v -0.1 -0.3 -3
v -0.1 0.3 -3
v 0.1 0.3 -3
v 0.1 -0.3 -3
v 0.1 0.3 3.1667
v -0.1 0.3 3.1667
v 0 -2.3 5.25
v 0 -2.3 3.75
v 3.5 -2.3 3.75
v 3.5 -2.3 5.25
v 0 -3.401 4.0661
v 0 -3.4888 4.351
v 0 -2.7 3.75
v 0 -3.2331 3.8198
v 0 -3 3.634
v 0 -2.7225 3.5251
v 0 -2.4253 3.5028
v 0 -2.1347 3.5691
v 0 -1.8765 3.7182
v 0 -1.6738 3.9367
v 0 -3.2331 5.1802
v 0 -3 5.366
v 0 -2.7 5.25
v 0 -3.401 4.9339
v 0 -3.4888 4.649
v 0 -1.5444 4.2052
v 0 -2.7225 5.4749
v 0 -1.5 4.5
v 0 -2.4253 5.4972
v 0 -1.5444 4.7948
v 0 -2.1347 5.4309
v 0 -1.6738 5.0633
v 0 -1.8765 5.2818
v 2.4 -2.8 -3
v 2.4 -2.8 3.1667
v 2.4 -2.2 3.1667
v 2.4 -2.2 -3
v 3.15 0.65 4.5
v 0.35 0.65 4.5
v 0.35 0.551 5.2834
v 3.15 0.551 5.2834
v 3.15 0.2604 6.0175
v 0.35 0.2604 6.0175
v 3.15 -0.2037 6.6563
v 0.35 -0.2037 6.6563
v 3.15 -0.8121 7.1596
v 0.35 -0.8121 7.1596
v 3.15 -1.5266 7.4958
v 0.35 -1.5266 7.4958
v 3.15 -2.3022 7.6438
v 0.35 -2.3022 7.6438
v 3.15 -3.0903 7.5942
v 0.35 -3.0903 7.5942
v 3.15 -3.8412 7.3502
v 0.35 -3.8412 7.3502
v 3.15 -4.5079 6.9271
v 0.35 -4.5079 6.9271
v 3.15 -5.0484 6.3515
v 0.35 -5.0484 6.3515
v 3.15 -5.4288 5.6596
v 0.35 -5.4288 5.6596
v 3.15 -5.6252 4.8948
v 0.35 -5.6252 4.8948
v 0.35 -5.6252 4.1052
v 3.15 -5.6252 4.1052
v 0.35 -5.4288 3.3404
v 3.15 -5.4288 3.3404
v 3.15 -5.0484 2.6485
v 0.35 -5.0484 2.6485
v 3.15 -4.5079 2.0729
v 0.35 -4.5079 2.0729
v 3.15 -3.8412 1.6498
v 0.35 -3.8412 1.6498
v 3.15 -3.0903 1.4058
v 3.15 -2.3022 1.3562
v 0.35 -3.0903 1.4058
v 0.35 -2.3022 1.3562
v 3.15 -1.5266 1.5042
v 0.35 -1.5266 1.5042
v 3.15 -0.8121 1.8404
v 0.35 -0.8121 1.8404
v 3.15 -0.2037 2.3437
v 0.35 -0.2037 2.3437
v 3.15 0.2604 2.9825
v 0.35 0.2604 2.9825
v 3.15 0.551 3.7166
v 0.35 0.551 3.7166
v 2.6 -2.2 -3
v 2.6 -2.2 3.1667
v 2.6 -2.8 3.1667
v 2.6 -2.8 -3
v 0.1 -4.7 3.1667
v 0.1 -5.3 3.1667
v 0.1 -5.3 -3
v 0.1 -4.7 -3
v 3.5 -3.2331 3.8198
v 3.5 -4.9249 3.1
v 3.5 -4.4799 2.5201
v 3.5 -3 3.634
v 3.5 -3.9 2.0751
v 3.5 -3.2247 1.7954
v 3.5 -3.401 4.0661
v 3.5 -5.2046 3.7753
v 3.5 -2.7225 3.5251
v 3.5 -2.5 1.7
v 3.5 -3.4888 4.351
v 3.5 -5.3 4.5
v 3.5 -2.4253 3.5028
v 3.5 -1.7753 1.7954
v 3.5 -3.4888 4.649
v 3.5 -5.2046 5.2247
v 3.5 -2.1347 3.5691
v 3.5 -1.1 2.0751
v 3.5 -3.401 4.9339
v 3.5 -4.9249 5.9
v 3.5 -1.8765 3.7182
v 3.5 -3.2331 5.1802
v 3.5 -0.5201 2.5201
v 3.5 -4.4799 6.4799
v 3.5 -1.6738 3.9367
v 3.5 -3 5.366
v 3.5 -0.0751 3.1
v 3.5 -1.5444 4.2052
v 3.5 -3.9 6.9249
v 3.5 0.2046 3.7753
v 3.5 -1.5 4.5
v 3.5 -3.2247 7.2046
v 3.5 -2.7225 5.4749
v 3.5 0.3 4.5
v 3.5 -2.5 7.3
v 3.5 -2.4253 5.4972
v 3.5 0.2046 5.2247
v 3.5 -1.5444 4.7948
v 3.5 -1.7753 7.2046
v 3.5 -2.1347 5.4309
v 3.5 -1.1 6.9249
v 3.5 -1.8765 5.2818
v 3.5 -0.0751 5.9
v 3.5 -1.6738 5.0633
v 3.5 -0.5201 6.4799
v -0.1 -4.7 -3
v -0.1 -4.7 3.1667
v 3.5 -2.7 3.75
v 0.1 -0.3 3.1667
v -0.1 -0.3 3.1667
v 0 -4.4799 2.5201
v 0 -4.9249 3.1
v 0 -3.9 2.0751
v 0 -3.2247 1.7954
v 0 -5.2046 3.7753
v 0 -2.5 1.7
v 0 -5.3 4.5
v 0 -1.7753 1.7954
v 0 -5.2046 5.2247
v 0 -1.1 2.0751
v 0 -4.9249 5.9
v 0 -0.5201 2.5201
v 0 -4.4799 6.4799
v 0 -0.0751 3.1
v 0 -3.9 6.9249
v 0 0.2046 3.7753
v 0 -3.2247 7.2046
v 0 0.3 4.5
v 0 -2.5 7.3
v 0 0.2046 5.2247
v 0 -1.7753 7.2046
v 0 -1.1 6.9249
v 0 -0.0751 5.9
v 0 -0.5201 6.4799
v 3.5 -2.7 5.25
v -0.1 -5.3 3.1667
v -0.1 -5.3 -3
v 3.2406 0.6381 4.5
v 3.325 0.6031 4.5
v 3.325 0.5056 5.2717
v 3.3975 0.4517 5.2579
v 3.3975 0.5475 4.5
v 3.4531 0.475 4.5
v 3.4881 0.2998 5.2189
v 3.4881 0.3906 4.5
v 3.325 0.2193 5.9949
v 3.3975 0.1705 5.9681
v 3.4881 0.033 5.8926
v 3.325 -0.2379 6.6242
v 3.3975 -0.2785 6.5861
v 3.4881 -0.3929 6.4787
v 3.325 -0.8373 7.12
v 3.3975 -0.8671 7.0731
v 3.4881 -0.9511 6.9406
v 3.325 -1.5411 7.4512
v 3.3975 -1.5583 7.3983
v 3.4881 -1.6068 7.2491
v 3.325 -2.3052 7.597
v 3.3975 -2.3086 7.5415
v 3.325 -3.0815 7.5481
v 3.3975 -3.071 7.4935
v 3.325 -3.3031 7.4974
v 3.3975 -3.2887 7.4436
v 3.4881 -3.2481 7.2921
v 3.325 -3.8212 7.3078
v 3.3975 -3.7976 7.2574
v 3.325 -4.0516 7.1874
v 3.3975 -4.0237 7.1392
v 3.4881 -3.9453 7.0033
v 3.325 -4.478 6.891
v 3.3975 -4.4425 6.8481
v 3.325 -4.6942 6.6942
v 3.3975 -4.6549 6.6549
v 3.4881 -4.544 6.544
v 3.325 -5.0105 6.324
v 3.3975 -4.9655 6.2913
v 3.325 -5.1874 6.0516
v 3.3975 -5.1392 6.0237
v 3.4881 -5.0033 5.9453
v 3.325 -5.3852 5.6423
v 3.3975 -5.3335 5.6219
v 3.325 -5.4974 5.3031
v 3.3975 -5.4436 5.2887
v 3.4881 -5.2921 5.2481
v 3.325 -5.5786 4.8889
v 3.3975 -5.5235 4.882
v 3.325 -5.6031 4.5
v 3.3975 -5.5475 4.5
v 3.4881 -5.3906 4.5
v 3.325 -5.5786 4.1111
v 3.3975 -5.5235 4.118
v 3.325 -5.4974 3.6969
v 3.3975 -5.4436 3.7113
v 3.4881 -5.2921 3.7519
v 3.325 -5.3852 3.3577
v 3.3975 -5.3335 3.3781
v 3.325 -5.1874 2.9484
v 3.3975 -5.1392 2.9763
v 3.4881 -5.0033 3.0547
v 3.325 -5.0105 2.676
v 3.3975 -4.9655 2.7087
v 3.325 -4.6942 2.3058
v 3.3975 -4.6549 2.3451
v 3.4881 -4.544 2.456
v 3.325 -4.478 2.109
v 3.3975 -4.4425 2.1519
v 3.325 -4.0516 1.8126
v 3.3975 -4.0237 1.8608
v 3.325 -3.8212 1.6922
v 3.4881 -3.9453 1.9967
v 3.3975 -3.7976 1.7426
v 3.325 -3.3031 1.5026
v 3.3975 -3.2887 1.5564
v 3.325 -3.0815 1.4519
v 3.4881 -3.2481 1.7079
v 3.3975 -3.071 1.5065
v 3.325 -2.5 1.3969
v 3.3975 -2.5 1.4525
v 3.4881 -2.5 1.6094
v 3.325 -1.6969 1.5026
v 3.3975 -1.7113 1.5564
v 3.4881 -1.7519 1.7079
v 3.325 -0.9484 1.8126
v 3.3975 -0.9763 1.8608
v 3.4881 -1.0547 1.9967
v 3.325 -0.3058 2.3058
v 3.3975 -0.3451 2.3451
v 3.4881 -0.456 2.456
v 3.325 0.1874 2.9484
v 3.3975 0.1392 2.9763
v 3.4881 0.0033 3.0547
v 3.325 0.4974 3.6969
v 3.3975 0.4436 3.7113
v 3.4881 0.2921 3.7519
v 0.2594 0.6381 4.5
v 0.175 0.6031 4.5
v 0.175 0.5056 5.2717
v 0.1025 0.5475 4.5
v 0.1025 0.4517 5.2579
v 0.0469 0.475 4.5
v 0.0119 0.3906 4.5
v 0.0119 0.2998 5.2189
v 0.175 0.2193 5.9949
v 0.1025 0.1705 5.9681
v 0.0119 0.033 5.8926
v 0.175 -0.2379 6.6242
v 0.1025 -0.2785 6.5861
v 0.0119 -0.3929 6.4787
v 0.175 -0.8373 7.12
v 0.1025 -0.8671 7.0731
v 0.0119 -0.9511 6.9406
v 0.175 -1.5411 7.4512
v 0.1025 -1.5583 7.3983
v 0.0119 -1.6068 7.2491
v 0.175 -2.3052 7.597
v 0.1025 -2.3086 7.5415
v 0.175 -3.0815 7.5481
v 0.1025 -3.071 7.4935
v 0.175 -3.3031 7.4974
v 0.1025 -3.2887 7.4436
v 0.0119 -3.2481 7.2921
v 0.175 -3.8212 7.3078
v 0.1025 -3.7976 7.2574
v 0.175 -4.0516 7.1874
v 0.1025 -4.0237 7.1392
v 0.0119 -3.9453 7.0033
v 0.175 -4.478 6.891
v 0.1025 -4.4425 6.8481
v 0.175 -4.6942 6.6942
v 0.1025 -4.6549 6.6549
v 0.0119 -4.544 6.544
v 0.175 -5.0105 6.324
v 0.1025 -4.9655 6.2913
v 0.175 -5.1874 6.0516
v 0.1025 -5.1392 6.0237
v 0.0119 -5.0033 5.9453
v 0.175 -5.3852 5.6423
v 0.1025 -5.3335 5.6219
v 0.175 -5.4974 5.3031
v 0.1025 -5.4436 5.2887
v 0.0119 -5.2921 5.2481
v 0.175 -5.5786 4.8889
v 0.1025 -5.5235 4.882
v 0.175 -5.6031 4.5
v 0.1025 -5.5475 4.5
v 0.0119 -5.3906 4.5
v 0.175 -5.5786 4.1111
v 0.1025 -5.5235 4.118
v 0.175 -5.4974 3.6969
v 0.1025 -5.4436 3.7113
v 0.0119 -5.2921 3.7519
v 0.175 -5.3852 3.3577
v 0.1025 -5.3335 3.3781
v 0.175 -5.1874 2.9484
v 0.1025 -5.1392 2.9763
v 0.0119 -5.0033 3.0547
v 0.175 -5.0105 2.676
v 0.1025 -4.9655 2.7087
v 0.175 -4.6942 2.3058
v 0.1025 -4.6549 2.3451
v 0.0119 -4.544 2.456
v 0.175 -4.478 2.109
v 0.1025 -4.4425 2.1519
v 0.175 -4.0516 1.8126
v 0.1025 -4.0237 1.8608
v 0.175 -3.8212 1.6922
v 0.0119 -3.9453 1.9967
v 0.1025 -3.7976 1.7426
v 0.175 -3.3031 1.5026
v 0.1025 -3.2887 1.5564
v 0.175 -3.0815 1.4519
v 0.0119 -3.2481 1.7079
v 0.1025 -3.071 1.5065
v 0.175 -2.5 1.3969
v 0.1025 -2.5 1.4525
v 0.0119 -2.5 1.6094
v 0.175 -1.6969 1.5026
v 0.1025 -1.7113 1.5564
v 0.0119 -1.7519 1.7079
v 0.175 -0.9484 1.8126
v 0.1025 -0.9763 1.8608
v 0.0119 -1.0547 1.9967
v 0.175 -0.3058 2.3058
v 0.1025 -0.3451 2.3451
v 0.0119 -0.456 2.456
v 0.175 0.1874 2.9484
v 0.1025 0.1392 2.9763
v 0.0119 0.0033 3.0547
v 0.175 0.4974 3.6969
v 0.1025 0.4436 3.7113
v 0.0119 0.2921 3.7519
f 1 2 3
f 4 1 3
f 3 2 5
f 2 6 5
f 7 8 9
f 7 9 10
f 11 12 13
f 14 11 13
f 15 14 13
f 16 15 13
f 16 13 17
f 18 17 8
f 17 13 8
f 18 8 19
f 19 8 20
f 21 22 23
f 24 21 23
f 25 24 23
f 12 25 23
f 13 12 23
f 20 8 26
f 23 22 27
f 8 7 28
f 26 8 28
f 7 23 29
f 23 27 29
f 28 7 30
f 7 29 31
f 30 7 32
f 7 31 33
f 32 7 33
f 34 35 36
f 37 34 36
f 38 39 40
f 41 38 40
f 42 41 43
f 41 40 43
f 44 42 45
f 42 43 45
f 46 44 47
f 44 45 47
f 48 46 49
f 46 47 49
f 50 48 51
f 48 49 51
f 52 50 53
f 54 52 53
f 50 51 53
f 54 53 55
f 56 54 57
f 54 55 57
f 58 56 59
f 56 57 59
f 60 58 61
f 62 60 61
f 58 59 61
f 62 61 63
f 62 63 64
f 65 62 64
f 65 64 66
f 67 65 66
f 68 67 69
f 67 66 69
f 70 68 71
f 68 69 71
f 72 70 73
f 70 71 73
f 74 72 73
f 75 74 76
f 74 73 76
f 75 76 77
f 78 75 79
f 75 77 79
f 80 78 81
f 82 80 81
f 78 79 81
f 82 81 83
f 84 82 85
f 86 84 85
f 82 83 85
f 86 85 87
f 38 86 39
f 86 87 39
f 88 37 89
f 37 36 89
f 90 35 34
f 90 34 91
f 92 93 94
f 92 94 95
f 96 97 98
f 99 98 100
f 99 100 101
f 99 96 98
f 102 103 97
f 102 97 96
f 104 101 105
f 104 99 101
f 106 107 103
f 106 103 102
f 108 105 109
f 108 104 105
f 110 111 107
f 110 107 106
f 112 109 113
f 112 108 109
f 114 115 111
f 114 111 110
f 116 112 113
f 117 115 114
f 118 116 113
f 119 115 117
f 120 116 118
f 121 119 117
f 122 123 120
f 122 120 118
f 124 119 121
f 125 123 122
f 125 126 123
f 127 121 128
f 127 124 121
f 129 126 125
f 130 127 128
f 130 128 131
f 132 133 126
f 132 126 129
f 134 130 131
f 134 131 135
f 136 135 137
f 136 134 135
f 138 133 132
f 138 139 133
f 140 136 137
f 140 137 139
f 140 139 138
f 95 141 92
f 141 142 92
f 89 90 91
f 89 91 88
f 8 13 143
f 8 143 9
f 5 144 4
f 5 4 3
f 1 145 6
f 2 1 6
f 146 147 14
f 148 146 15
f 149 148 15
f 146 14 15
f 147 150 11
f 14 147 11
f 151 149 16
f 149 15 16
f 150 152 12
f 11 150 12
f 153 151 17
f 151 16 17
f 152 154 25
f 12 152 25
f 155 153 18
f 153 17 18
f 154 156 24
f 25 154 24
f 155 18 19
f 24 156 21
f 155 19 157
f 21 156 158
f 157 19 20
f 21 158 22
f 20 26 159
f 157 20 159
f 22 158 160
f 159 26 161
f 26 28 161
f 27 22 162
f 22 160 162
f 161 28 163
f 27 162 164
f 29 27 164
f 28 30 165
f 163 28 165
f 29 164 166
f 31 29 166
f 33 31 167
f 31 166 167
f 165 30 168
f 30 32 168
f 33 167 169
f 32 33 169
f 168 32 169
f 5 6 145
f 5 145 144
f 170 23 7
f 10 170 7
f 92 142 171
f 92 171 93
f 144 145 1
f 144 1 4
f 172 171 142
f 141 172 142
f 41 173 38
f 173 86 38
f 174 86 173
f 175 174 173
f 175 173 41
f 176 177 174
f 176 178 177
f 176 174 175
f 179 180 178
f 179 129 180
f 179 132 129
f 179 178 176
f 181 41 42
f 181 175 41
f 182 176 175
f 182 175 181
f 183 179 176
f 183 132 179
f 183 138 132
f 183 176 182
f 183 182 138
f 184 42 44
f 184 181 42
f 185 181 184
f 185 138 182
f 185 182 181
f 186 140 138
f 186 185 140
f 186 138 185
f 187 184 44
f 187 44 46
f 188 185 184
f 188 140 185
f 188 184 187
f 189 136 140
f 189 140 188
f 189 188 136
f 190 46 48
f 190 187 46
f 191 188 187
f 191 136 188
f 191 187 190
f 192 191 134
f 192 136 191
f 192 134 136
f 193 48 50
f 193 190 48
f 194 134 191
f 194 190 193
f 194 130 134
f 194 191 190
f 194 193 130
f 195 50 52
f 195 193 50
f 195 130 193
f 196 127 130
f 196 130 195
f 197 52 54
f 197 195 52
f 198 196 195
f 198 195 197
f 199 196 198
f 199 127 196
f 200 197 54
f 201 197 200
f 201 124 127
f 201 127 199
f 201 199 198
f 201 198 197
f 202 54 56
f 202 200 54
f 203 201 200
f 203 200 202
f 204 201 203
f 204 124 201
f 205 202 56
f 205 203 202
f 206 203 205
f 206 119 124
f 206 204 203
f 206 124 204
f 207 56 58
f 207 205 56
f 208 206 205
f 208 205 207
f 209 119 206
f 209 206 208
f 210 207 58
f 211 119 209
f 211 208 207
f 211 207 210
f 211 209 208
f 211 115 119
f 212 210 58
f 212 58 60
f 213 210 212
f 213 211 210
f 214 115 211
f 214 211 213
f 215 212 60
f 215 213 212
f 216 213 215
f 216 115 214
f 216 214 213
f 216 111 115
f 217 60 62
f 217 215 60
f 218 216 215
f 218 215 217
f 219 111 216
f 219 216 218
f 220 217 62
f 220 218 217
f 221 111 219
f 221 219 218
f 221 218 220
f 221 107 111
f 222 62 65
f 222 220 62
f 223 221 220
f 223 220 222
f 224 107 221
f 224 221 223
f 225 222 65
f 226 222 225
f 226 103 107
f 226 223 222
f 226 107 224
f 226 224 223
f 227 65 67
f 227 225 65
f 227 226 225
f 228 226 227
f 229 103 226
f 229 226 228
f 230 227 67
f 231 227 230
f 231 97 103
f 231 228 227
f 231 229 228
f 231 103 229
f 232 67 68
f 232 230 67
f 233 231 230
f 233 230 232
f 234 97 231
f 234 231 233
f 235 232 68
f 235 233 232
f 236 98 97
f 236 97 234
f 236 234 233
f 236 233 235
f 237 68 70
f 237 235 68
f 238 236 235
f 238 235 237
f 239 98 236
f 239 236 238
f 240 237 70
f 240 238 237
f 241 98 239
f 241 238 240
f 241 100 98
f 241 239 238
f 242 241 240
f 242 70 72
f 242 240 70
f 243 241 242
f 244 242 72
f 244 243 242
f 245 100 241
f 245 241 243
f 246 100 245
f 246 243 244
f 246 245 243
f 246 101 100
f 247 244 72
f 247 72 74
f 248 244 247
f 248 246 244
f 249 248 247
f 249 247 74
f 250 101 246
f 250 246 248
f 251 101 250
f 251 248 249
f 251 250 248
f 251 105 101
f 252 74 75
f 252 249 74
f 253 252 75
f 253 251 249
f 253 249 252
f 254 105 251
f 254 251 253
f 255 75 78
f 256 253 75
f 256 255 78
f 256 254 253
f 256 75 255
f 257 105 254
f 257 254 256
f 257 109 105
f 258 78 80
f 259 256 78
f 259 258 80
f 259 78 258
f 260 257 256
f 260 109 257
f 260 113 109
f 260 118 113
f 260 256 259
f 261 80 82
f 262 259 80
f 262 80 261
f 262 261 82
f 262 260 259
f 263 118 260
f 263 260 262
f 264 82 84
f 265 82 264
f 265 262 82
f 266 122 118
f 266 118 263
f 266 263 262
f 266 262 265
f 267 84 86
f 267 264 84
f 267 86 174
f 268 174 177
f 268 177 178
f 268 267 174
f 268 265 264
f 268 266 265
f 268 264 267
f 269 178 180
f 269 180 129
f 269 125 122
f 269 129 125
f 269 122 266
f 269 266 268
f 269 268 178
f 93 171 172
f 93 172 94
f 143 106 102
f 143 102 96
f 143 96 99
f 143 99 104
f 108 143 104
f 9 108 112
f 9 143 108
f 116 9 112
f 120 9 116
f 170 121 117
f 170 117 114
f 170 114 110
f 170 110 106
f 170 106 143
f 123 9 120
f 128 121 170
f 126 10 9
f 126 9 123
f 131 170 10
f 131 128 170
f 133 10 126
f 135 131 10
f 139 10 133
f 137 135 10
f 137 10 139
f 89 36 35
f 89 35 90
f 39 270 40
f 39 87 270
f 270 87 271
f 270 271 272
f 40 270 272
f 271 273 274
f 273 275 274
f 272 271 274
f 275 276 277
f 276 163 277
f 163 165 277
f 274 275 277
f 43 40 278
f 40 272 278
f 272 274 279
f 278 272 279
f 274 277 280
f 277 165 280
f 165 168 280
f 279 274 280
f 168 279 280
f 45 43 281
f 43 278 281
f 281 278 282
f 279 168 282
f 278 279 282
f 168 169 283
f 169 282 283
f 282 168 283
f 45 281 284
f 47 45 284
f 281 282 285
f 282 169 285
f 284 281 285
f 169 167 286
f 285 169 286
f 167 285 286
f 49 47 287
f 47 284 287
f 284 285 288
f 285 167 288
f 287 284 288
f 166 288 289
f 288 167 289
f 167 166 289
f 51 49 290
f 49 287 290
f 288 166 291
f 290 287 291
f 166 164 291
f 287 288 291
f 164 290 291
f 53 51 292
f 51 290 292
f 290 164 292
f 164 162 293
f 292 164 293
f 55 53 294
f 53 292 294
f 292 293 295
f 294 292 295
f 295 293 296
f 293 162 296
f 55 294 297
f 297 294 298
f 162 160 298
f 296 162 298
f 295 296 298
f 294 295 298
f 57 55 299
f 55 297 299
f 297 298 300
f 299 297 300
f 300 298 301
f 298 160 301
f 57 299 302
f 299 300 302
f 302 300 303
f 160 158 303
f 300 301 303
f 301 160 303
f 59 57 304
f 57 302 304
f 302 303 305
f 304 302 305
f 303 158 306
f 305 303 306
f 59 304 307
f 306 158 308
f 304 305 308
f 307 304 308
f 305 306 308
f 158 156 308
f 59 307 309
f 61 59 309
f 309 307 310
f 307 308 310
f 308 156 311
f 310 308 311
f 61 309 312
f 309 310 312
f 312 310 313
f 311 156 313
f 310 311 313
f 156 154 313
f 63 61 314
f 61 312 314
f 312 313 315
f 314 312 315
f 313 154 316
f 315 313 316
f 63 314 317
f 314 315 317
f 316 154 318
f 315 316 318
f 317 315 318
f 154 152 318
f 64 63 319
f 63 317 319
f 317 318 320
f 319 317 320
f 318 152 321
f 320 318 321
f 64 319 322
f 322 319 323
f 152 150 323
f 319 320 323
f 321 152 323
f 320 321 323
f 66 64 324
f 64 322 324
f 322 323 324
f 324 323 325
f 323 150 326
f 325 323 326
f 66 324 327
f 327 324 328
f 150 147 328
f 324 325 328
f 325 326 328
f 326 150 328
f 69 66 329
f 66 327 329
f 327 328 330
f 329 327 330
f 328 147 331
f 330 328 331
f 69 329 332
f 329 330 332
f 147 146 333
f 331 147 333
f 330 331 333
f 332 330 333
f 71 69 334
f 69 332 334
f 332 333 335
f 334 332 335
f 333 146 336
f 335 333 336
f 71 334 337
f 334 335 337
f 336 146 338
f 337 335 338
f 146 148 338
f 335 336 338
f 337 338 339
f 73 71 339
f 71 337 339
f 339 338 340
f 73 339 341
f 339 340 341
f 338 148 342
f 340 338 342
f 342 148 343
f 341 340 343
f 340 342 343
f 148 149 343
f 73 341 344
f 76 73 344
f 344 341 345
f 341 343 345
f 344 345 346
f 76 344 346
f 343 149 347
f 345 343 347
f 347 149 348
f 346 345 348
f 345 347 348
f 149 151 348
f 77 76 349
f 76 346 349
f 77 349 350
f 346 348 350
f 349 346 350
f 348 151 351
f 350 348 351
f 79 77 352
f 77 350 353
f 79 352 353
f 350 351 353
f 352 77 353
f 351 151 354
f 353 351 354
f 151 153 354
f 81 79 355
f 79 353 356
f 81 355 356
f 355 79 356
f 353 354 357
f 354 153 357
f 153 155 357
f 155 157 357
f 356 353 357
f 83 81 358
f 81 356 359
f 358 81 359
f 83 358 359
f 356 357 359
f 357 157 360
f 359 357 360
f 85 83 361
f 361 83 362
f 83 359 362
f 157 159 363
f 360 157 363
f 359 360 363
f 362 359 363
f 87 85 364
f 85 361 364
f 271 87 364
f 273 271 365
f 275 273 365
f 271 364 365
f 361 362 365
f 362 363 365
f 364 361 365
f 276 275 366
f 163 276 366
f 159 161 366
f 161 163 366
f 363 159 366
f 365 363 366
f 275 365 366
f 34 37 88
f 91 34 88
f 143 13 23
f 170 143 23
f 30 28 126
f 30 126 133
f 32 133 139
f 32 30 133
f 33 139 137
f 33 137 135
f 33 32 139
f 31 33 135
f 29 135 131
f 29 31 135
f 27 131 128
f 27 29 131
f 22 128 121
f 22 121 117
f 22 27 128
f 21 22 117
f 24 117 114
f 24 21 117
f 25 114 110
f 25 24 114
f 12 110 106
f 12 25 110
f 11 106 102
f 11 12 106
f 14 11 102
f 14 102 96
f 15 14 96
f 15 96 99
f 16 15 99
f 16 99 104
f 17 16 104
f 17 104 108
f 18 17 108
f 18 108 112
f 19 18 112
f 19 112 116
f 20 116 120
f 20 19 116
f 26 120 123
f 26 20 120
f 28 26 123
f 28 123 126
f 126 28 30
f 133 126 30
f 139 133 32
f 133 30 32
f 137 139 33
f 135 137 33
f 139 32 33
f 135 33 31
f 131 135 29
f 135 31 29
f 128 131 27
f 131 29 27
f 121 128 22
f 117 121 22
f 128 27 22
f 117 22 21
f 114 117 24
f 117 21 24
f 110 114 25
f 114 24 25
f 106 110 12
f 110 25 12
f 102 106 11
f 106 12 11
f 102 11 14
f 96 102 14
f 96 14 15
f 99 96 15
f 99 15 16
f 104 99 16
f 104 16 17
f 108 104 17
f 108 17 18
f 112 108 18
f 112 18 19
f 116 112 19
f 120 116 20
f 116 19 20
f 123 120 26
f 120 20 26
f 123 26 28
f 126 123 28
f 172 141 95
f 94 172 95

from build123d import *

# Parameters (mm, degrees)
SKETCH001_R       = 1
SKETCH001_W       = 0.4
SKETCH001_H       = 1.5
PAD001_DEPTH      = 3.5
SKETCH_R          = 3.15
SKETCH_R_2        = 1
PAD_DEPTH         = 3.5
FILLET_R          = 0.35
SKETCH003_W       = 0.2
SKETCH003_H       = 0.6
PAD002_DEPTH      = 3.166667
PAD002_DEPTH_BACK = 3


with BuildPart() as pad001:
    # Sketch001 → Pad001 (new body)
    with BuildSketch(Plane.YZ):
        with Locations((-2.5, 4.5)):
            Circle(SKETCH001_R)
        with Locations((-2.5, 4.5)):
            Rectangle(SKETCH001_W, SKETCH001_H, mode=Mode.SUBTRACT)
    extrude(amount=PAD001_DEPTH)


with BuildPart() as fillet_body:
    # Sketch → Pad (new body)
    with BuildSketch(Plane.YZ):
        with Locations((-2.5, 4.5)):
            Circle(SKETCH_R)
        with Locations((-2.5, 4.5)):
            Circle(SKETCH_R_2, mode=Mode.SUBTRACT)
    extrude(amount=PAD_DEPTH)

    # Fillet
    fillet_edges = [fillet_body.edges().sort_by_distance(p)[0] for p in [
        (0, -5.65, 4.5),
        (3.5, -5.65, 4.5),
    ]]
    fillet(fillet_edges, radius=FILLET_R)


with BuildPart() as pad002:
    # Sketch003 → Pad002 (new body, two sides)
    with BuildSketch(Plane.XY) as pad002_sk:
        Rectangle(SKETCH003_W, SKETCH003_H)
        with Locations((2.5, -2.5)):
            Rectangle(SKETCH003_W, SKETCH003_H)
        with Locations((0, -5)):
            Rectangle(SKETCH003_W, SKETCH003_H)
    extrude(amount=PAD002_DEPTH)
    extrude(pad002_sk.sketch, amount=-PAD002_DEPTH_BACK)


solid = Compound([pad001.part, fillet_body.part, pad002.part])
